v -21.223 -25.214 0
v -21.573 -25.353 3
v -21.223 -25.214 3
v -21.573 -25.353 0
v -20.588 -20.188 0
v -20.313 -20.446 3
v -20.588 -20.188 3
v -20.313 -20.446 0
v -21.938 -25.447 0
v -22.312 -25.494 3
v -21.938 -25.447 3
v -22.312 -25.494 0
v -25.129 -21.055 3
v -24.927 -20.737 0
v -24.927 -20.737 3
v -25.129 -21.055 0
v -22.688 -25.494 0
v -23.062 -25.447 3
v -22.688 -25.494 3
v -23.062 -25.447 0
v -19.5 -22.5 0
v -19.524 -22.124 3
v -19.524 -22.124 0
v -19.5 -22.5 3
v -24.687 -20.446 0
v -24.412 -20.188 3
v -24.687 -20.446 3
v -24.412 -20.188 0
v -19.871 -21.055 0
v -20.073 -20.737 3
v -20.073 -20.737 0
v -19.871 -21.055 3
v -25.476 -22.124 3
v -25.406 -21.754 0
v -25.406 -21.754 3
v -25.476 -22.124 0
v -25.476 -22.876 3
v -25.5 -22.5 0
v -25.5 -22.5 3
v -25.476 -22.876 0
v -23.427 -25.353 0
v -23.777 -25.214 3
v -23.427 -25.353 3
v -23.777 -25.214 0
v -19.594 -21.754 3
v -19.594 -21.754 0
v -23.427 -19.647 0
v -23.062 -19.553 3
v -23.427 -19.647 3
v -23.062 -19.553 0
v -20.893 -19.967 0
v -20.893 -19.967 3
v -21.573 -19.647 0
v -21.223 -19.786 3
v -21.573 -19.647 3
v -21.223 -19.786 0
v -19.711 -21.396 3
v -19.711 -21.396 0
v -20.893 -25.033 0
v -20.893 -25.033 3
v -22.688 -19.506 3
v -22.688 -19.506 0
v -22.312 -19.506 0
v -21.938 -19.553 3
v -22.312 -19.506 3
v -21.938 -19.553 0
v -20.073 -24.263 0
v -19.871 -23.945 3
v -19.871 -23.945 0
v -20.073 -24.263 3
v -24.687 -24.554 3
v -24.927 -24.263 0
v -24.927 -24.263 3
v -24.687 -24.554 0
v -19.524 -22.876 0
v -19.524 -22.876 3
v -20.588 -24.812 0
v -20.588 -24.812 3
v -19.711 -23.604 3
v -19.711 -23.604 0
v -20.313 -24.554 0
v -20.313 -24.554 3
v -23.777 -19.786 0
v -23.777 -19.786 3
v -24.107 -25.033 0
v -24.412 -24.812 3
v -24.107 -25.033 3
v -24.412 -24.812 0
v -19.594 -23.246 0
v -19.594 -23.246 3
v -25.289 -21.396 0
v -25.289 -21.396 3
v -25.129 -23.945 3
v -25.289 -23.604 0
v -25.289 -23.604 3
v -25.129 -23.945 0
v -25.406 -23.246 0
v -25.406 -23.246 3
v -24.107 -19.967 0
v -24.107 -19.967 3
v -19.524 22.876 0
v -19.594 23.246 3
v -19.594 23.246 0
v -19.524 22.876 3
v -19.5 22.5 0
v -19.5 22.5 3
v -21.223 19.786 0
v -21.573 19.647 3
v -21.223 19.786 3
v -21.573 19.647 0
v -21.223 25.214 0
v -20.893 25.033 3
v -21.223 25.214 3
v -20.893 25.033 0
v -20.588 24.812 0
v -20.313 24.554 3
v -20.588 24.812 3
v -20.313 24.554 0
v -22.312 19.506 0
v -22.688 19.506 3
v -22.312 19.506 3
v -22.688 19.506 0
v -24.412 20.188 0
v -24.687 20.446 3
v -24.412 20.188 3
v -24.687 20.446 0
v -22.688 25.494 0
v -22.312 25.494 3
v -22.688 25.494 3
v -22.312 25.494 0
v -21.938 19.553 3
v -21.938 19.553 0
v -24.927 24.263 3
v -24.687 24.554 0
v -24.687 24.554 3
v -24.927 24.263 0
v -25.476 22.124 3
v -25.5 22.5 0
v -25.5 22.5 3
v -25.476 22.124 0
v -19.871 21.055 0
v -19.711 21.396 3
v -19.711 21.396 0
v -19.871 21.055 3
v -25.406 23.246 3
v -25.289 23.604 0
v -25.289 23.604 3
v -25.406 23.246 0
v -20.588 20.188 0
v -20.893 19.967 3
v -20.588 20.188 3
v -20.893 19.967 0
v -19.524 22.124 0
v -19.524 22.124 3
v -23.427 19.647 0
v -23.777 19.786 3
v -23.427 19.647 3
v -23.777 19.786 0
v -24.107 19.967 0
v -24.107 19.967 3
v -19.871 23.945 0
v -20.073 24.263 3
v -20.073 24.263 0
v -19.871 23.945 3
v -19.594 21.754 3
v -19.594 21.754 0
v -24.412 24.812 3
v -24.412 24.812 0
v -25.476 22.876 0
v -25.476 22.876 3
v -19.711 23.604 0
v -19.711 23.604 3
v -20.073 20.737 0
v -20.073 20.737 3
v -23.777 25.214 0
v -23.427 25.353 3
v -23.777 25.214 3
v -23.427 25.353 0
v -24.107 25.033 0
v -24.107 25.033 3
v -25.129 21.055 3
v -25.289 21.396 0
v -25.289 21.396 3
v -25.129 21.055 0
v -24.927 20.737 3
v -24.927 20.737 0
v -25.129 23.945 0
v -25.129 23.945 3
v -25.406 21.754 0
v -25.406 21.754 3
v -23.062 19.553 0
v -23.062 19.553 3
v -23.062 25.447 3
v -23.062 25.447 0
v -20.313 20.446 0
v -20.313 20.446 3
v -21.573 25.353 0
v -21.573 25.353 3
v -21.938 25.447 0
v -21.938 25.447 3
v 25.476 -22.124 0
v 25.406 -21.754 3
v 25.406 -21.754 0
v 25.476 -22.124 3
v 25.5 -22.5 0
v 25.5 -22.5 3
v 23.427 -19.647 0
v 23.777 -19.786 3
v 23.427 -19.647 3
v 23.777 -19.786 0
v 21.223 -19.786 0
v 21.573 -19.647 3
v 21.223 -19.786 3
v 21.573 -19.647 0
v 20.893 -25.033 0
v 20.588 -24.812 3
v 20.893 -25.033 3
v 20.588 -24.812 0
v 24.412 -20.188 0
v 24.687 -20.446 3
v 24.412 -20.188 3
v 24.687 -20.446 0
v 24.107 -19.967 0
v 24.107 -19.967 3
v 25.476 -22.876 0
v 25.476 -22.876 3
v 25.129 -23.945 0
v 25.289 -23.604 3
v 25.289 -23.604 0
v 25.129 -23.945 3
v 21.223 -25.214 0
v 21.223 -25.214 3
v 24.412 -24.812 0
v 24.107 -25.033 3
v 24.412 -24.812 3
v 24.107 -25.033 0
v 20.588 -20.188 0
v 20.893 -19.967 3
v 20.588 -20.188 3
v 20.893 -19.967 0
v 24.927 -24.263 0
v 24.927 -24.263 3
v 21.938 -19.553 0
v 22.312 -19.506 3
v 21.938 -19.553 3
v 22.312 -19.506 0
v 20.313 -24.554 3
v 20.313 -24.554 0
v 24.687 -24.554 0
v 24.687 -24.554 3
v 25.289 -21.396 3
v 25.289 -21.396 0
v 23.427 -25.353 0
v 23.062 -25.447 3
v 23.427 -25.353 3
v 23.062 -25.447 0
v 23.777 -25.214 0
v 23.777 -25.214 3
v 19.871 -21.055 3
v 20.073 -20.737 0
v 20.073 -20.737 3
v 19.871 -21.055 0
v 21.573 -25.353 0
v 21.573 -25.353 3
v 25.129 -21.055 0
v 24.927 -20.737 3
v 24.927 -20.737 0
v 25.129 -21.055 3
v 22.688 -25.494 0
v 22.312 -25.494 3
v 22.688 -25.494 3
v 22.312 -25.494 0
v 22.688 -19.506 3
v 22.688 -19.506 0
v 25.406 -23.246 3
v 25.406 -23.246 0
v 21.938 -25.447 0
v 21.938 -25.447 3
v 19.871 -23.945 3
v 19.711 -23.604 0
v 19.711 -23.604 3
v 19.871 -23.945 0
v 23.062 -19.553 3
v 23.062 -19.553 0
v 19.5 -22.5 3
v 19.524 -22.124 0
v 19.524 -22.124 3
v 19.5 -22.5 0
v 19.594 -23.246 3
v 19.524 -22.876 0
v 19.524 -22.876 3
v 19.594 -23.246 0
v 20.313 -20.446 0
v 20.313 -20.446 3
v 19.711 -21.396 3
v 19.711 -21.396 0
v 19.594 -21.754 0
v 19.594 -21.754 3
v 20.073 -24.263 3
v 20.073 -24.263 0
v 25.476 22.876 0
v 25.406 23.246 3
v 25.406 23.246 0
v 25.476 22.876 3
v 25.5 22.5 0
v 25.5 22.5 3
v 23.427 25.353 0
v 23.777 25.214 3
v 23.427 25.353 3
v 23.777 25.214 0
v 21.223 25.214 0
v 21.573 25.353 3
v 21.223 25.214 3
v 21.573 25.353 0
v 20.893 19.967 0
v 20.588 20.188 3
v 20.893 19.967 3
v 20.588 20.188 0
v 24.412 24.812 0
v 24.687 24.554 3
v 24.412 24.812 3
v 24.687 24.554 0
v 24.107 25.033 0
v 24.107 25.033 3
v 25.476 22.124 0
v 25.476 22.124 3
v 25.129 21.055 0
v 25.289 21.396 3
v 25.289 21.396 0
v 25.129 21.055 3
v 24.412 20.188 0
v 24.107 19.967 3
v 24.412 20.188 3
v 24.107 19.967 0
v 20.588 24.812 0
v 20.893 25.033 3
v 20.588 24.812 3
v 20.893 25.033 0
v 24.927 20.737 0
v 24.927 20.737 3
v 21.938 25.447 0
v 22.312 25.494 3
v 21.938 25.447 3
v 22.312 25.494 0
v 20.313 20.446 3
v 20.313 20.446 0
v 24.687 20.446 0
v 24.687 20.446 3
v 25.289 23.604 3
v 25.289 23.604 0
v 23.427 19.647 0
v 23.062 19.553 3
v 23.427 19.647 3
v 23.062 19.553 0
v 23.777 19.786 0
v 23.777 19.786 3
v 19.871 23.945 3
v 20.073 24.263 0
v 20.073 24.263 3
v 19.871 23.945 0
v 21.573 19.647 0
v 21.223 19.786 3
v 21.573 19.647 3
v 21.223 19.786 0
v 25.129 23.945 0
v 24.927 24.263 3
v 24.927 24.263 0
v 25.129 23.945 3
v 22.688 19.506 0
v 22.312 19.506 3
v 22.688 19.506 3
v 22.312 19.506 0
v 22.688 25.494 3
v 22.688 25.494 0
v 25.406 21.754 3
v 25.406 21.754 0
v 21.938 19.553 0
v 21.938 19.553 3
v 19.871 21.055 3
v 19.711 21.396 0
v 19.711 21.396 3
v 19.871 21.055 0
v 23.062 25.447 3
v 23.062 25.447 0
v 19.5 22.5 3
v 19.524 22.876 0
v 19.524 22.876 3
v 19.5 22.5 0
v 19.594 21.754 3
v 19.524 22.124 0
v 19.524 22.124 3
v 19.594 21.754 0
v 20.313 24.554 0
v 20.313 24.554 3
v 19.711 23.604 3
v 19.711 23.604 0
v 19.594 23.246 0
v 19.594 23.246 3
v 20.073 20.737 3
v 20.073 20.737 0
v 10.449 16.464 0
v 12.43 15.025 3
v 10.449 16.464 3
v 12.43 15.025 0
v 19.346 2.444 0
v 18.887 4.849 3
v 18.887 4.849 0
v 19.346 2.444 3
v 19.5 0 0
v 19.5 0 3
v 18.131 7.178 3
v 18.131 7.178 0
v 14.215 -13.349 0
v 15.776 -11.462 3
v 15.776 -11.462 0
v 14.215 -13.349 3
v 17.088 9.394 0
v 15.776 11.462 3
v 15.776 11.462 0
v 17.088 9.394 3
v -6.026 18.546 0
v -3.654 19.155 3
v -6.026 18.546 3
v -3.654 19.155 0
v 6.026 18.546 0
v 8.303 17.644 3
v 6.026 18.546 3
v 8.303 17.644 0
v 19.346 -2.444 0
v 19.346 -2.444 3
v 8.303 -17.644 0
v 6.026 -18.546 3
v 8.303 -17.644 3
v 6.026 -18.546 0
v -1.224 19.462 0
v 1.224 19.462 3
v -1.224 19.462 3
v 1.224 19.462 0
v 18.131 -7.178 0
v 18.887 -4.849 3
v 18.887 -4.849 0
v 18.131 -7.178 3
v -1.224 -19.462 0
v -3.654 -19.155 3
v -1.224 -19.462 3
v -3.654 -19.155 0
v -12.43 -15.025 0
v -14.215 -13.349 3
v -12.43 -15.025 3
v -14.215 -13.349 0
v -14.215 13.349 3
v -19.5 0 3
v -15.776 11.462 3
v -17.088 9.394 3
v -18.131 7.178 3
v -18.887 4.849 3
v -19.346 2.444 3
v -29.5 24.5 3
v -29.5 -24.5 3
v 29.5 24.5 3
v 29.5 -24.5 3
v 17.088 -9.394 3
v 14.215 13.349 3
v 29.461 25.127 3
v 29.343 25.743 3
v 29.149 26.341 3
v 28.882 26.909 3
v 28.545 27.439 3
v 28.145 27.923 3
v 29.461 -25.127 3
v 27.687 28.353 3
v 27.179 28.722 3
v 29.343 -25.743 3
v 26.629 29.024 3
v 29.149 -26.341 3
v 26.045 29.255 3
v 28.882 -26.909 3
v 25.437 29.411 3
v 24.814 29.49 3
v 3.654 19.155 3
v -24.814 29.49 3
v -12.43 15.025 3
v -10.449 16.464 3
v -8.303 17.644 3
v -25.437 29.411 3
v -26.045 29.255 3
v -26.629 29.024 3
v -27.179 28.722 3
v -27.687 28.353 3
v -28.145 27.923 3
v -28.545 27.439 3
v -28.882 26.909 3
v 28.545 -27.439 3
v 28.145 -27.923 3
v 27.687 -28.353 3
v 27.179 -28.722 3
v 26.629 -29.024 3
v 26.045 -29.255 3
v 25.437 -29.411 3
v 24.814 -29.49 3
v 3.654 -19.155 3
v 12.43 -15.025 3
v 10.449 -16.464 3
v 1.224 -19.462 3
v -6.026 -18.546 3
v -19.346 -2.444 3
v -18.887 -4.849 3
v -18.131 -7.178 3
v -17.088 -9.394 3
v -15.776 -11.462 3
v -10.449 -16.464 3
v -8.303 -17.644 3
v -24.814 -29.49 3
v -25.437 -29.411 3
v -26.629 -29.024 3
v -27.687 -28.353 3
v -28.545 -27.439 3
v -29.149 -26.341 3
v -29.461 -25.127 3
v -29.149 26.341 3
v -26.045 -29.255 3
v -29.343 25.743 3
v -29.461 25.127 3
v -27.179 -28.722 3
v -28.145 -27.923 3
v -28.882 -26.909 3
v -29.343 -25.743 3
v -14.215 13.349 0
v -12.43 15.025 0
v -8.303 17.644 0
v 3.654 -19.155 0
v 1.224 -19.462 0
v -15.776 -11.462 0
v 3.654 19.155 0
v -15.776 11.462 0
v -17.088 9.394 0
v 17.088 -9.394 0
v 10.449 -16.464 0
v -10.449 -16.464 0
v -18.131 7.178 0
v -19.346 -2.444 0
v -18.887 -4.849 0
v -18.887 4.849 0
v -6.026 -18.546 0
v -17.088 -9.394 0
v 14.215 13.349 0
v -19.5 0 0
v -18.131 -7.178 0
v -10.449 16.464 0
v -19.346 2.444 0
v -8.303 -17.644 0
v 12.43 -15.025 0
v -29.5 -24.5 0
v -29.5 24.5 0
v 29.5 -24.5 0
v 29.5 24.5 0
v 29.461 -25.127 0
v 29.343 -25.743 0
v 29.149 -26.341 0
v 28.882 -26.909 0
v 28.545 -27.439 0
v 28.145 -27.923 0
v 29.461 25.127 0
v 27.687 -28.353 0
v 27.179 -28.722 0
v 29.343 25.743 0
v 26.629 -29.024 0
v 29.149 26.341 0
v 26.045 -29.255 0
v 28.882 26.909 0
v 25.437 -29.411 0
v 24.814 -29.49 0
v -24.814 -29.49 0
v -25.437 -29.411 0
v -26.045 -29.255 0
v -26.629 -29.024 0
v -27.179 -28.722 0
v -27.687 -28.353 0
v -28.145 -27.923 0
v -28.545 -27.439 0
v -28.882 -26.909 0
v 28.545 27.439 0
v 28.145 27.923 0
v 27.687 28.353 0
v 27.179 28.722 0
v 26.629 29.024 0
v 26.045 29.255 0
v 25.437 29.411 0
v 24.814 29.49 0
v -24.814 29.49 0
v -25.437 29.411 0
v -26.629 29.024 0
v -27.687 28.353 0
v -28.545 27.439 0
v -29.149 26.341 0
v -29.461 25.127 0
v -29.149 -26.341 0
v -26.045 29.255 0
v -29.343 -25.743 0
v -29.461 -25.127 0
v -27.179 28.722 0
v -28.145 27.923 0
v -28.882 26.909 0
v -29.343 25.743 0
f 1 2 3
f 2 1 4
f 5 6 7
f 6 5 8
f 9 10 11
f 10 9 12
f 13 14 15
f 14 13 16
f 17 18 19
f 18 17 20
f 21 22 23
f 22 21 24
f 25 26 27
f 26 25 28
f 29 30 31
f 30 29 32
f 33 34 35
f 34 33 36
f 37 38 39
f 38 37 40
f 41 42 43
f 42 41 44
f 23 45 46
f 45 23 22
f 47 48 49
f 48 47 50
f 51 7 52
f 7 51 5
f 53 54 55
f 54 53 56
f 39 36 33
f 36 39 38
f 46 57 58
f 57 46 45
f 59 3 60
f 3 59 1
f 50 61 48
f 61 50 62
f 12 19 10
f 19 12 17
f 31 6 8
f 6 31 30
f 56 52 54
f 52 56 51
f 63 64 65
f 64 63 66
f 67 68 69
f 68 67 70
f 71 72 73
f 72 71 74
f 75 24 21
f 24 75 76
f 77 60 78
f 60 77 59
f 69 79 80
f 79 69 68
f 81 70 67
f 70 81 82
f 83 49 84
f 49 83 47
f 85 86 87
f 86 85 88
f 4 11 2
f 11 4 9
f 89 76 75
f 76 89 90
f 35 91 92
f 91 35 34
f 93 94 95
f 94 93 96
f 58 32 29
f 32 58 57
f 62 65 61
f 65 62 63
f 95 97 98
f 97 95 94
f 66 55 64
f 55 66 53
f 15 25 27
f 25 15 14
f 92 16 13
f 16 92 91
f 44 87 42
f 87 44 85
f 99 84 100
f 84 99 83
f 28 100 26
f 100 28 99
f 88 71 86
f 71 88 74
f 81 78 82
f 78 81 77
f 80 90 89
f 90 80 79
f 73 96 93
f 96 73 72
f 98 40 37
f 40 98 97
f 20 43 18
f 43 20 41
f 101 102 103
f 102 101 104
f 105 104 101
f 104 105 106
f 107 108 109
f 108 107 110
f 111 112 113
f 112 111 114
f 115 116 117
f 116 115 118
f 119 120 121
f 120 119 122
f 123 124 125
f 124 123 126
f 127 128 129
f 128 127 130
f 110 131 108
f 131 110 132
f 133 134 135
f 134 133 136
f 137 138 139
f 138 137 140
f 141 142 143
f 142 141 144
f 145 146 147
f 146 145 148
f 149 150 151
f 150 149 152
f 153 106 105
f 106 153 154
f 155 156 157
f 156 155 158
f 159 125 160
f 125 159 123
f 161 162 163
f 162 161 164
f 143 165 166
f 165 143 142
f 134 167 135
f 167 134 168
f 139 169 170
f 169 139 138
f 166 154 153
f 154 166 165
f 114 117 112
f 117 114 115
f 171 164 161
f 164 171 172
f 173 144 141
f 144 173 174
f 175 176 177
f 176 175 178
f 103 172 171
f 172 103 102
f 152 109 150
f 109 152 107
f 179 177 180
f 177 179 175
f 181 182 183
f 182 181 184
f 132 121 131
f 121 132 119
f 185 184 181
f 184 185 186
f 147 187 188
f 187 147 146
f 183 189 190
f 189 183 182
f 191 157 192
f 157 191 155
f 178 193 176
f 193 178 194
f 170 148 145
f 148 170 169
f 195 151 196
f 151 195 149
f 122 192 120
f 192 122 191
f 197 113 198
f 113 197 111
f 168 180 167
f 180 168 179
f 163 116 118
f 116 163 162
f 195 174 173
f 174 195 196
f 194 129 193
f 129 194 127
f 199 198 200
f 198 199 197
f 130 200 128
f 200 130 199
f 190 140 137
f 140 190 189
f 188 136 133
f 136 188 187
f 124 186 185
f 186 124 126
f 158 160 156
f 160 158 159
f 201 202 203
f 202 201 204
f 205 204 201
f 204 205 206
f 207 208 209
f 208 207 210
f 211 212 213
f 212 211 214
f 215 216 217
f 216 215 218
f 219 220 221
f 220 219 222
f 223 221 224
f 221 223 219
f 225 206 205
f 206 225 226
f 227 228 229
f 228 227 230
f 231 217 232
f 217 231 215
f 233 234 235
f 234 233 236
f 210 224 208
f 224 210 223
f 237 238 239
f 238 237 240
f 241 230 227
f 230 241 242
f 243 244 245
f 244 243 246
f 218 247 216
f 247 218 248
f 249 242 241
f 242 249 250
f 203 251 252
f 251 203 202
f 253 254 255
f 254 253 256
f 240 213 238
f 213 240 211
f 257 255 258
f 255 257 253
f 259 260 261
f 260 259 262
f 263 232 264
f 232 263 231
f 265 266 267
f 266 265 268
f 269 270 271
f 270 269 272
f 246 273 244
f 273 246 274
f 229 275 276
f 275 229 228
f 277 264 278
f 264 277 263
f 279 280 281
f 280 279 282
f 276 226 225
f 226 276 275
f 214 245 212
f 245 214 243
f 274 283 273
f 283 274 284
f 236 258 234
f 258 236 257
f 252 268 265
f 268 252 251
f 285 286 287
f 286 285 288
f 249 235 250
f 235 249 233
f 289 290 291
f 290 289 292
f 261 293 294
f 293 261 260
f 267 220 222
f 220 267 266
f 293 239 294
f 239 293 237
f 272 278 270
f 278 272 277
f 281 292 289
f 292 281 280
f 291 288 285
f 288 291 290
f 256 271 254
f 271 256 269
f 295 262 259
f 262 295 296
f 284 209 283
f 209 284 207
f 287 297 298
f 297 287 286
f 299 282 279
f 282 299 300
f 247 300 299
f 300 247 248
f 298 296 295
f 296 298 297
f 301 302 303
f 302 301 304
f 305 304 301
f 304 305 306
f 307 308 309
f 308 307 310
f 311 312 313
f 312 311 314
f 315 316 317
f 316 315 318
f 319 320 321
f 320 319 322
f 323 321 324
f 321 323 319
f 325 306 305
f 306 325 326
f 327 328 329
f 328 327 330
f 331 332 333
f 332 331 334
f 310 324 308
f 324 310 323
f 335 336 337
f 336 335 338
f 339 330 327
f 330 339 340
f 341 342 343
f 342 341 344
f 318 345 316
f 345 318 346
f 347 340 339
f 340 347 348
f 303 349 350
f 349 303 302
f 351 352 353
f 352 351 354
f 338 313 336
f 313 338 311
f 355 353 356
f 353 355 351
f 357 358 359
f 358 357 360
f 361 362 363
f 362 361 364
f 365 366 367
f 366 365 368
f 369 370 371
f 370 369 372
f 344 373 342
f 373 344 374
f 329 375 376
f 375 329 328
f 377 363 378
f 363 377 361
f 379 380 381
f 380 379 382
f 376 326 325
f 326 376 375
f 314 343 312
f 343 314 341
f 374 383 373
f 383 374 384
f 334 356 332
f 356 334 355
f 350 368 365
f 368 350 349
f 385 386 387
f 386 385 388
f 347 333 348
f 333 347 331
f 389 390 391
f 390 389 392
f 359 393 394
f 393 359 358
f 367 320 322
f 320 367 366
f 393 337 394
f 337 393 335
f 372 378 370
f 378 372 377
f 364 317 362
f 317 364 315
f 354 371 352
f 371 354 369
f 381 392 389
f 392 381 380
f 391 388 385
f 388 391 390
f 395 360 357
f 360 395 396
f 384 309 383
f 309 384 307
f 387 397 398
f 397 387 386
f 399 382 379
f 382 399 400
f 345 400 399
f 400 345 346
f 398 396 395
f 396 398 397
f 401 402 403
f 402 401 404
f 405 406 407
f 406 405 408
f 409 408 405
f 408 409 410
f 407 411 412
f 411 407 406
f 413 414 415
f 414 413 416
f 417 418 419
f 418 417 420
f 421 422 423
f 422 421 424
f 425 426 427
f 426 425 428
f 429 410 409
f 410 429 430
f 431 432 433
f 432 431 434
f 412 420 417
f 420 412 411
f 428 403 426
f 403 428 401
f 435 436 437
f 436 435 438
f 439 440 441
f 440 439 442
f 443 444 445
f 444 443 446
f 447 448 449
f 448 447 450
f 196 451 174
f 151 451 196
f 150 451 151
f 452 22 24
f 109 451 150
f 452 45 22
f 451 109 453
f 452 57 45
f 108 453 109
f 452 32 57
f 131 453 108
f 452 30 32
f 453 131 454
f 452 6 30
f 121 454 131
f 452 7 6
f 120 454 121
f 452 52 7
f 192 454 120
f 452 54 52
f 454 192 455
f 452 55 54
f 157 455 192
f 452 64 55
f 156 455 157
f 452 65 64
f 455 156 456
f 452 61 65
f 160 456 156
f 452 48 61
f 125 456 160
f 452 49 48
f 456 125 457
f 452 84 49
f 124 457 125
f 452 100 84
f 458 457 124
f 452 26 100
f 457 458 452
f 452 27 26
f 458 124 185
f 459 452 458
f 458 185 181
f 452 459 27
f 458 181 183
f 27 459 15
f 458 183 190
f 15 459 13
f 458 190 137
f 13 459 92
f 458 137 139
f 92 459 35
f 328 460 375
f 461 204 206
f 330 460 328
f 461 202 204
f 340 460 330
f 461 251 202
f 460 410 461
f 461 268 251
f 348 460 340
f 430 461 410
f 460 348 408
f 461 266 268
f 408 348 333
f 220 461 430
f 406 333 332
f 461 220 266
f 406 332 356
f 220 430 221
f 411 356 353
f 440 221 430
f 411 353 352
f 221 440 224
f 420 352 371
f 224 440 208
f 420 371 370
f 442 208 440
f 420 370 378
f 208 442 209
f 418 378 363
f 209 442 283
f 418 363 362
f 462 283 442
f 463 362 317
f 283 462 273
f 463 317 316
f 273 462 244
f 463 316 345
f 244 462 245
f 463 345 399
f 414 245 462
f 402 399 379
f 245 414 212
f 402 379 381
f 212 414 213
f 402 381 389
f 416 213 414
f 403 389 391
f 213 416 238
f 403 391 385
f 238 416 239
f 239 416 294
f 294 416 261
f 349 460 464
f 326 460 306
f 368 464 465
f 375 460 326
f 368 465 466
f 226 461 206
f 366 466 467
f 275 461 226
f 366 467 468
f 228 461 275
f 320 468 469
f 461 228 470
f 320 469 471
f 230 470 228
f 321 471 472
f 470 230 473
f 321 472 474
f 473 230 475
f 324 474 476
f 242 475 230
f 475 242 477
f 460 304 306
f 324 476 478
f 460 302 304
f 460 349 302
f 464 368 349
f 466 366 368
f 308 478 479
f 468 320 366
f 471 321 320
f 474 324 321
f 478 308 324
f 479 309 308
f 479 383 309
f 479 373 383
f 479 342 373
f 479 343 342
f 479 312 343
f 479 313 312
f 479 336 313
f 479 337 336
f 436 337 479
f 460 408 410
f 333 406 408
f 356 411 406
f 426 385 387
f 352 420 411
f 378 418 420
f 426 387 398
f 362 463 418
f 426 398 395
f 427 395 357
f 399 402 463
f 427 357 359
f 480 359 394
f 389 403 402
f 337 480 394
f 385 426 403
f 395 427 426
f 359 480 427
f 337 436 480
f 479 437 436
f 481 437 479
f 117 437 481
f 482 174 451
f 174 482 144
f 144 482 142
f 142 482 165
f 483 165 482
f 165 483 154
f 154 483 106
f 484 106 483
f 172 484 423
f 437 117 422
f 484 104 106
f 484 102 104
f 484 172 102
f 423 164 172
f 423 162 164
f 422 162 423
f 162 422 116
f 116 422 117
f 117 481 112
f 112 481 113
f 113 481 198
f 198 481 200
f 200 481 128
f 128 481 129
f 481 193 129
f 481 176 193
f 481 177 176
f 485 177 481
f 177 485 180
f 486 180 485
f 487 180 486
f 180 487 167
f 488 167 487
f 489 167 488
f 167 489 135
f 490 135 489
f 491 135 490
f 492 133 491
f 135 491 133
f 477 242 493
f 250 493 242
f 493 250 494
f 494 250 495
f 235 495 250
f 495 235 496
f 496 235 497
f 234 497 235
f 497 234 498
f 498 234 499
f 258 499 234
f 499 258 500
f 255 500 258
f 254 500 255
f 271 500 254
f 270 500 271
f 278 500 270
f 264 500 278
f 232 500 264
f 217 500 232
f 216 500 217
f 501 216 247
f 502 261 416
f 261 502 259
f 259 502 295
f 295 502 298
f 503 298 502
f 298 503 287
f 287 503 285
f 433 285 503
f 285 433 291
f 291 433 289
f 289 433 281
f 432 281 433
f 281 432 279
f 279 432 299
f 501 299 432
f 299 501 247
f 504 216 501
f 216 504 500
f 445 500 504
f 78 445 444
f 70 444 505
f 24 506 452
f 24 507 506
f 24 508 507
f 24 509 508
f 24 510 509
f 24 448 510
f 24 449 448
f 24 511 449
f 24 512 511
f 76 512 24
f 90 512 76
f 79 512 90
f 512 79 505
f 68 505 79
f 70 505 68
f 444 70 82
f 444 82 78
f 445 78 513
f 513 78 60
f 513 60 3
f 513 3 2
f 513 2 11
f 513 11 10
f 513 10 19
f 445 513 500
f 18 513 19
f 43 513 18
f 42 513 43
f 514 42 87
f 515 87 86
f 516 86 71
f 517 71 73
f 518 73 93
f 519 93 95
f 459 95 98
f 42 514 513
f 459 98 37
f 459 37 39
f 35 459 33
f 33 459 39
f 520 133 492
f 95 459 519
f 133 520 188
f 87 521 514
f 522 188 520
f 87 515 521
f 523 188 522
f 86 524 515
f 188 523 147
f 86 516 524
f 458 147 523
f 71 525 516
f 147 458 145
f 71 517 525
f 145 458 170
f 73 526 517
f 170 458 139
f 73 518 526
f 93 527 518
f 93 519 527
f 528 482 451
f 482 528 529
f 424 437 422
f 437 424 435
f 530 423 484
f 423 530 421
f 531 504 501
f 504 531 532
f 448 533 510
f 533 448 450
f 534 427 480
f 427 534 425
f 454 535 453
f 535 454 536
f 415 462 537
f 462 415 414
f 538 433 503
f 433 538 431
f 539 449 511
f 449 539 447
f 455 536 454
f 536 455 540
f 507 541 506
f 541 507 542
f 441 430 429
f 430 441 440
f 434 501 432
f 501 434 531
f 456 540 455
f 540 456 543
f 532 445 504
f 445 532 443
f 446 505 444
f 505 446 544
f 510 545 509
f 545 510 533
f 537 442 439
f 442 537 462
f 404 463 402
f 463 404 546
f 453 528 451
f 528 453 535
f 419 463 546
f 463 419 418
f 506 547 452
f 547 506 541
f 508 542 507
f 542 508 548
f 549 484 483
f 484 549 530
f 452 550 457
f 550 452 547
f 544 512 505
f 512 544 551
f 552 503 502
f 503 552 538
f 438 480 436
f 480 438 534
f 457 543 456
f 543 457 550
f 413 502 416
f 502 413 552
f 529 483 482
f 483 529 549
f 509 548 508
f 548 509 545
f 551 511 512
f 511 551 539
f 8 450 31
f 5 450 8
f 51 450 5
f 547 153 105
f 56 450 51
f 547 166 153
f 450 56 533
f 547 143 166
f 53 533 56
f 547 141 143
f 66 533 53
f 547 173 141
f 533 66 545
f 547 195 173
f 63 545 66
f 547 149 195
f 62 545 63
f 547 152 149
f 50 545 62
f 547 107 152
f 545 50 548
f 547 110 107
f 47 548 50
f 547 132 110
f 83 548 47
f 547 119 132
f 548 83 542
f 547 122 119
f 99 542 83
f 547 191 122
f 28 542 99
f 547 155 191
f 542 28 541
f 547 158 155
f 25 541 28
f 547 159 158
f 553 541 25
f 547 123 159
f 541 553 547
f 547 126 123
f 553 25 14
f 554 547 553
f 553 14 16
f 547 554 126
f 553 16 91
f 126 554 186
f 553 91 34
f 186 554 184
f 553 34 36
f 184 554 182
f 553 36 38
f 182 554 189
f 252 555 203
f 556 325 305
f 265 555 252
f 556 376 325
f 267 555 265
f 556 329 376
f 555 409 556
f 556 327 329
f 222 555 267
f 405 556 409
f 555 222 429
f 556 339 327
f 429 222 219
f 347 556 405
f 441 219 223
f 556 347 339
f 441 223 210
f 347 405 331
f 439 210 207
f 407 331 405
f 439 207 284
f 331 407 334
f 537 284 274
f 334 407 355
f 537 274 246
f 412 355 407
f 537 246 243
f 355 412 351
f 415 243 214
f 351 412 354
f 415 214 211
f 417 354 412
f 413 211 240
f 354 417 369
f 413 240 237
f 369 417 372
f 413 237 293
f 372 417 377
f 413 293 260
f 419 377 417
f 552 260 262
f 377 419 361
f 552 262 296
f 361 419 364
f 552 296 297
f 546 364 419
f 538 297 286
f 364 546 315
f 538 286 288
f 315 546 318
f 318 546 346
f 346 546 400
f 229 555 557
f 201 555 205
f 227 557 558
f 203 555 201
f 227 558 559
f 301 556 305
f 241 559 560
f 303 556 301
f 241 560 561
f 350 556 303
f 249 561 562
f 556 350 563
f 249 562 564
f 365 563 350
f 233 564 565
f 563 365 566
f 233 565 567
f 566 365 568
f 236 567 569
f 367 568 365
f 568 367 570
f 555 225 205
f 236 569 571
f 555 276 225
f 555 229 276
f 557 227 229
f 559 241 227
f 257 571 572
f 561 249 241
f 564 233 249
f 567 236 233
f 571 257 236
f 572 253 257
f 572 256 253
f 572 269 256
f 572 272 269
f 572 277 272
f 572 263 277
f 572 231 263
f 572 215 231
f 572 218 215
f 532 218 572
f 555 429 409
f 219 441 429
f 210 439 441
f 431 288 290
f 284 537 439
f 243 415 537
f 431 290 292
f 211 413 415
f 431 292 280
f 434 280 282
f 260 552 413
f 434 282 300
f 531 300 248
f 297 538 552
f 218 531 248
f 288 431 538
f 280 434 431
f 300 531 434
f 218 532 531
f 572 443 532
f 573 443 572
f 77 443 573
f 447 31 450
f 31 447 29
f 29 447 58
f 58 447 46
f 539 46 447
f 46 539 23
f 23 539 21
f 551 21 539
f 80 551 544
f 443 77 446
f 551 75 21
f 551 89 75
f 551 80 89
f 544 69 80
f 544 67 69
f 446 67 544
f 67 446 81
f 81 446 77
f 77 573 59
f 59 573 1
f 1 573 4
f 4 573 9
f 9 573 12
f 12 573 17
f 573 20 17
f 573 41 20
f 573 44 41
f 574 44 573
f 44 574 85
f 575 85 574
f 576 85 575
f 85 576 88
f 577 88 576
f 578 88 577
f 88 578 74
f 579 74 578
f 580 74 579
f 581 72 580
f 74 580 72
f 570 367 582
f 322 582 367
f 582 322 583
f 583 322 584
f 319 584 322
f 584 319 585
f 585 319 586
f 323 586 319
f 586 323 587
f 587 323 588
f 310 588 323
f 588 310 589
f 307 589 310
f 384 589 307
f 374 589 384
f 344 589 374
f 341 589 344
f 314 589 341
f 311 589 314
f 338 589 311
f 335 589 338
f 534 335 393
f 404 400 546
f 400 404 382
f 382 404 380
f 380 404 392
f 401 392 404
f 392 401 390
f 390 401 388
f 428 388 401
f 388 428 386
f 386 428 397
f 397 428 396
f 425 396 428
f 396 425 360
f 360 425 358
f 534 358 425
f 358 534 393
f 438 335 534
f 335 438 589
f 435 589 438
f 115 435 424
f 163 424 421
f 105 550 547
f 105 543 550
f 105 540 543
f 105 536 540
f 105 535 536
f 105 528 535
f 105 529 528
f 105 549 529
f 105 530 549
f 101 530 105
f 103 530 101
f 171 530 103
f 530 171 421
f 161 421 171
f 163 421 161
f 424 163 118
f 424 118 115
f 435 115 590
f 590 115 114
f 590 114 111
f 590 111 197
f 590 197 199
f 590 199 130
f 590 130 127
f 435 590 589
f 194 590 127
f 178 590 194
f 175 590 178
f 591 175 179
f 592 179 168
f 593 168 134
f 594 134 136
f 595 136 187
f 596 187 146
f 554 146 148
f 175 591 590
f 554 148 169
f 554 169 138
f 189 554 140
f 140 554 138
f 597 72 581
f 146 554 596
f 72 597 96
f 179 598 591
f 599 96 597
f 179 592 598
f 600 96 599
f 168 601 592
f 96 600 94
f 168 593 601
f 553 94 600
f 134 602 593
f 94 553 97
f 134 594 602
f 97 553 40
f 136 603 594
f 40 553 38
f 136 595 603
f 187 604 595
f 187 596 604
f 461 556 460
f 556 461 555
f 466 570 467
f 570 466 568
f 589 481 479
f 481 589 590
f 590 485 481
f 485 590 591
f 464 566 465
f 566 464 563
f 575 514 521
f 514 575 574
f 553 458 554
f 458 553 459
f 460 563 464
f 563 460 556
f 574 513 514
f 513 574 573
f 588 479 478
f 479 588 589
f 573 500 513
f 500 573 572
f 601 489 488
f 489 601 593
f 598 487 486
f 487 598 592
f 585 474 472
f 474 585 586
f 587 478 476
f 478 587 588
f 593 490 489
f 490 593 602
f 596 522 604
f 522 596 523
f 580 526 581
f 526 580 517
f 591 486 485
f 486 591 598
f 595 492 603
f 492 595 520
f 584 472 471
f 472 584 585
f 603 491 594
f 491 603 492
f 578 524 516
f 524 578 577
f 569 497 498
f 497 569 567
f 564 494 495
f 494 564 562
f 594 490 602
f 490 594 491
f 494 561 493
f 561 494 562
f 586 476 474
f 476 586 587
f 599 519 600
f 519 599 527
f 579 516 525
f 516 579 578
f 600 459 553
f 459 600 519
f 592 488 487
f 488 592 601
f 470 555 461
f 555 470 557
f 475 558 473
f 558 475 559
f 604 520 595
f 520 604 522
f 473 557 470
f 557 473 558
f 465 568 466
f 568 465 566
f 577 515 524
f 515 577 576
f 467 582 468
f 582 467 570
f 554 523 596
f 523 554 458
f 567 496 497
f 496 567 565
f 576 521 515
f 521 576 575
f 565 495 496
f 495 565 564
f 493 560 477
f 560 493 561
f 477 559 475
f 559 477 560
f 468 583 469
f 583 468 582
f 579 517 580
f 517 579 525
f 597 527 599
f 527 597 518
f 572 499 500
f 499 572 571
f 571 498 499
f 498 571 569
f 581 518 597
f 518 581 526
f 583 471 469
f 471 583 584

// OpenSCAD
$fn = 50;


difference() {
	union() {
		hull() {
			translate(v = [-24.5000000000, 24.5000000000, 0]) {
				cylinder(h = 3, r = 5);
			}
			translate(v = [24.5000000000, 24.5000000000, 0]) {
				cylinder(h = 3, r = 5);
			}
			translate(v = [-24.5000000000, -24.5000000000, 0]) {
				cylinder(h = 3, r = 5);
			}
			translate(v = [24.5000000000, -24.5000000000, 0]) {
				cylinder(h = 3, r = 5);
			}
		}
	}
	union() {
		#translate(v = [-22.5000000000, -22.5000000000, -100.0000000000]) {
			cylinder(h = 200, r = 3.0000000000);
		}
		#translate(v = [-22.5000000000, 22.5000000000, -100.0000000000]) {
			cylinder(h = 200, r = 3.0000000000);
		}
		#translate(v = [22.5000000000, -22.5000000000, -100.0000000000]) {
			cylinder(h = 200, r = 3.0000000000);
		}
		#translate(v = [22.5000000000, 22.5000000000, -100.0000000000]) {
			cylinder(h = 200, r = 3.0000000000);
		}
		#cylinder(h = 3, r = 19.5000000000);
	}
}
